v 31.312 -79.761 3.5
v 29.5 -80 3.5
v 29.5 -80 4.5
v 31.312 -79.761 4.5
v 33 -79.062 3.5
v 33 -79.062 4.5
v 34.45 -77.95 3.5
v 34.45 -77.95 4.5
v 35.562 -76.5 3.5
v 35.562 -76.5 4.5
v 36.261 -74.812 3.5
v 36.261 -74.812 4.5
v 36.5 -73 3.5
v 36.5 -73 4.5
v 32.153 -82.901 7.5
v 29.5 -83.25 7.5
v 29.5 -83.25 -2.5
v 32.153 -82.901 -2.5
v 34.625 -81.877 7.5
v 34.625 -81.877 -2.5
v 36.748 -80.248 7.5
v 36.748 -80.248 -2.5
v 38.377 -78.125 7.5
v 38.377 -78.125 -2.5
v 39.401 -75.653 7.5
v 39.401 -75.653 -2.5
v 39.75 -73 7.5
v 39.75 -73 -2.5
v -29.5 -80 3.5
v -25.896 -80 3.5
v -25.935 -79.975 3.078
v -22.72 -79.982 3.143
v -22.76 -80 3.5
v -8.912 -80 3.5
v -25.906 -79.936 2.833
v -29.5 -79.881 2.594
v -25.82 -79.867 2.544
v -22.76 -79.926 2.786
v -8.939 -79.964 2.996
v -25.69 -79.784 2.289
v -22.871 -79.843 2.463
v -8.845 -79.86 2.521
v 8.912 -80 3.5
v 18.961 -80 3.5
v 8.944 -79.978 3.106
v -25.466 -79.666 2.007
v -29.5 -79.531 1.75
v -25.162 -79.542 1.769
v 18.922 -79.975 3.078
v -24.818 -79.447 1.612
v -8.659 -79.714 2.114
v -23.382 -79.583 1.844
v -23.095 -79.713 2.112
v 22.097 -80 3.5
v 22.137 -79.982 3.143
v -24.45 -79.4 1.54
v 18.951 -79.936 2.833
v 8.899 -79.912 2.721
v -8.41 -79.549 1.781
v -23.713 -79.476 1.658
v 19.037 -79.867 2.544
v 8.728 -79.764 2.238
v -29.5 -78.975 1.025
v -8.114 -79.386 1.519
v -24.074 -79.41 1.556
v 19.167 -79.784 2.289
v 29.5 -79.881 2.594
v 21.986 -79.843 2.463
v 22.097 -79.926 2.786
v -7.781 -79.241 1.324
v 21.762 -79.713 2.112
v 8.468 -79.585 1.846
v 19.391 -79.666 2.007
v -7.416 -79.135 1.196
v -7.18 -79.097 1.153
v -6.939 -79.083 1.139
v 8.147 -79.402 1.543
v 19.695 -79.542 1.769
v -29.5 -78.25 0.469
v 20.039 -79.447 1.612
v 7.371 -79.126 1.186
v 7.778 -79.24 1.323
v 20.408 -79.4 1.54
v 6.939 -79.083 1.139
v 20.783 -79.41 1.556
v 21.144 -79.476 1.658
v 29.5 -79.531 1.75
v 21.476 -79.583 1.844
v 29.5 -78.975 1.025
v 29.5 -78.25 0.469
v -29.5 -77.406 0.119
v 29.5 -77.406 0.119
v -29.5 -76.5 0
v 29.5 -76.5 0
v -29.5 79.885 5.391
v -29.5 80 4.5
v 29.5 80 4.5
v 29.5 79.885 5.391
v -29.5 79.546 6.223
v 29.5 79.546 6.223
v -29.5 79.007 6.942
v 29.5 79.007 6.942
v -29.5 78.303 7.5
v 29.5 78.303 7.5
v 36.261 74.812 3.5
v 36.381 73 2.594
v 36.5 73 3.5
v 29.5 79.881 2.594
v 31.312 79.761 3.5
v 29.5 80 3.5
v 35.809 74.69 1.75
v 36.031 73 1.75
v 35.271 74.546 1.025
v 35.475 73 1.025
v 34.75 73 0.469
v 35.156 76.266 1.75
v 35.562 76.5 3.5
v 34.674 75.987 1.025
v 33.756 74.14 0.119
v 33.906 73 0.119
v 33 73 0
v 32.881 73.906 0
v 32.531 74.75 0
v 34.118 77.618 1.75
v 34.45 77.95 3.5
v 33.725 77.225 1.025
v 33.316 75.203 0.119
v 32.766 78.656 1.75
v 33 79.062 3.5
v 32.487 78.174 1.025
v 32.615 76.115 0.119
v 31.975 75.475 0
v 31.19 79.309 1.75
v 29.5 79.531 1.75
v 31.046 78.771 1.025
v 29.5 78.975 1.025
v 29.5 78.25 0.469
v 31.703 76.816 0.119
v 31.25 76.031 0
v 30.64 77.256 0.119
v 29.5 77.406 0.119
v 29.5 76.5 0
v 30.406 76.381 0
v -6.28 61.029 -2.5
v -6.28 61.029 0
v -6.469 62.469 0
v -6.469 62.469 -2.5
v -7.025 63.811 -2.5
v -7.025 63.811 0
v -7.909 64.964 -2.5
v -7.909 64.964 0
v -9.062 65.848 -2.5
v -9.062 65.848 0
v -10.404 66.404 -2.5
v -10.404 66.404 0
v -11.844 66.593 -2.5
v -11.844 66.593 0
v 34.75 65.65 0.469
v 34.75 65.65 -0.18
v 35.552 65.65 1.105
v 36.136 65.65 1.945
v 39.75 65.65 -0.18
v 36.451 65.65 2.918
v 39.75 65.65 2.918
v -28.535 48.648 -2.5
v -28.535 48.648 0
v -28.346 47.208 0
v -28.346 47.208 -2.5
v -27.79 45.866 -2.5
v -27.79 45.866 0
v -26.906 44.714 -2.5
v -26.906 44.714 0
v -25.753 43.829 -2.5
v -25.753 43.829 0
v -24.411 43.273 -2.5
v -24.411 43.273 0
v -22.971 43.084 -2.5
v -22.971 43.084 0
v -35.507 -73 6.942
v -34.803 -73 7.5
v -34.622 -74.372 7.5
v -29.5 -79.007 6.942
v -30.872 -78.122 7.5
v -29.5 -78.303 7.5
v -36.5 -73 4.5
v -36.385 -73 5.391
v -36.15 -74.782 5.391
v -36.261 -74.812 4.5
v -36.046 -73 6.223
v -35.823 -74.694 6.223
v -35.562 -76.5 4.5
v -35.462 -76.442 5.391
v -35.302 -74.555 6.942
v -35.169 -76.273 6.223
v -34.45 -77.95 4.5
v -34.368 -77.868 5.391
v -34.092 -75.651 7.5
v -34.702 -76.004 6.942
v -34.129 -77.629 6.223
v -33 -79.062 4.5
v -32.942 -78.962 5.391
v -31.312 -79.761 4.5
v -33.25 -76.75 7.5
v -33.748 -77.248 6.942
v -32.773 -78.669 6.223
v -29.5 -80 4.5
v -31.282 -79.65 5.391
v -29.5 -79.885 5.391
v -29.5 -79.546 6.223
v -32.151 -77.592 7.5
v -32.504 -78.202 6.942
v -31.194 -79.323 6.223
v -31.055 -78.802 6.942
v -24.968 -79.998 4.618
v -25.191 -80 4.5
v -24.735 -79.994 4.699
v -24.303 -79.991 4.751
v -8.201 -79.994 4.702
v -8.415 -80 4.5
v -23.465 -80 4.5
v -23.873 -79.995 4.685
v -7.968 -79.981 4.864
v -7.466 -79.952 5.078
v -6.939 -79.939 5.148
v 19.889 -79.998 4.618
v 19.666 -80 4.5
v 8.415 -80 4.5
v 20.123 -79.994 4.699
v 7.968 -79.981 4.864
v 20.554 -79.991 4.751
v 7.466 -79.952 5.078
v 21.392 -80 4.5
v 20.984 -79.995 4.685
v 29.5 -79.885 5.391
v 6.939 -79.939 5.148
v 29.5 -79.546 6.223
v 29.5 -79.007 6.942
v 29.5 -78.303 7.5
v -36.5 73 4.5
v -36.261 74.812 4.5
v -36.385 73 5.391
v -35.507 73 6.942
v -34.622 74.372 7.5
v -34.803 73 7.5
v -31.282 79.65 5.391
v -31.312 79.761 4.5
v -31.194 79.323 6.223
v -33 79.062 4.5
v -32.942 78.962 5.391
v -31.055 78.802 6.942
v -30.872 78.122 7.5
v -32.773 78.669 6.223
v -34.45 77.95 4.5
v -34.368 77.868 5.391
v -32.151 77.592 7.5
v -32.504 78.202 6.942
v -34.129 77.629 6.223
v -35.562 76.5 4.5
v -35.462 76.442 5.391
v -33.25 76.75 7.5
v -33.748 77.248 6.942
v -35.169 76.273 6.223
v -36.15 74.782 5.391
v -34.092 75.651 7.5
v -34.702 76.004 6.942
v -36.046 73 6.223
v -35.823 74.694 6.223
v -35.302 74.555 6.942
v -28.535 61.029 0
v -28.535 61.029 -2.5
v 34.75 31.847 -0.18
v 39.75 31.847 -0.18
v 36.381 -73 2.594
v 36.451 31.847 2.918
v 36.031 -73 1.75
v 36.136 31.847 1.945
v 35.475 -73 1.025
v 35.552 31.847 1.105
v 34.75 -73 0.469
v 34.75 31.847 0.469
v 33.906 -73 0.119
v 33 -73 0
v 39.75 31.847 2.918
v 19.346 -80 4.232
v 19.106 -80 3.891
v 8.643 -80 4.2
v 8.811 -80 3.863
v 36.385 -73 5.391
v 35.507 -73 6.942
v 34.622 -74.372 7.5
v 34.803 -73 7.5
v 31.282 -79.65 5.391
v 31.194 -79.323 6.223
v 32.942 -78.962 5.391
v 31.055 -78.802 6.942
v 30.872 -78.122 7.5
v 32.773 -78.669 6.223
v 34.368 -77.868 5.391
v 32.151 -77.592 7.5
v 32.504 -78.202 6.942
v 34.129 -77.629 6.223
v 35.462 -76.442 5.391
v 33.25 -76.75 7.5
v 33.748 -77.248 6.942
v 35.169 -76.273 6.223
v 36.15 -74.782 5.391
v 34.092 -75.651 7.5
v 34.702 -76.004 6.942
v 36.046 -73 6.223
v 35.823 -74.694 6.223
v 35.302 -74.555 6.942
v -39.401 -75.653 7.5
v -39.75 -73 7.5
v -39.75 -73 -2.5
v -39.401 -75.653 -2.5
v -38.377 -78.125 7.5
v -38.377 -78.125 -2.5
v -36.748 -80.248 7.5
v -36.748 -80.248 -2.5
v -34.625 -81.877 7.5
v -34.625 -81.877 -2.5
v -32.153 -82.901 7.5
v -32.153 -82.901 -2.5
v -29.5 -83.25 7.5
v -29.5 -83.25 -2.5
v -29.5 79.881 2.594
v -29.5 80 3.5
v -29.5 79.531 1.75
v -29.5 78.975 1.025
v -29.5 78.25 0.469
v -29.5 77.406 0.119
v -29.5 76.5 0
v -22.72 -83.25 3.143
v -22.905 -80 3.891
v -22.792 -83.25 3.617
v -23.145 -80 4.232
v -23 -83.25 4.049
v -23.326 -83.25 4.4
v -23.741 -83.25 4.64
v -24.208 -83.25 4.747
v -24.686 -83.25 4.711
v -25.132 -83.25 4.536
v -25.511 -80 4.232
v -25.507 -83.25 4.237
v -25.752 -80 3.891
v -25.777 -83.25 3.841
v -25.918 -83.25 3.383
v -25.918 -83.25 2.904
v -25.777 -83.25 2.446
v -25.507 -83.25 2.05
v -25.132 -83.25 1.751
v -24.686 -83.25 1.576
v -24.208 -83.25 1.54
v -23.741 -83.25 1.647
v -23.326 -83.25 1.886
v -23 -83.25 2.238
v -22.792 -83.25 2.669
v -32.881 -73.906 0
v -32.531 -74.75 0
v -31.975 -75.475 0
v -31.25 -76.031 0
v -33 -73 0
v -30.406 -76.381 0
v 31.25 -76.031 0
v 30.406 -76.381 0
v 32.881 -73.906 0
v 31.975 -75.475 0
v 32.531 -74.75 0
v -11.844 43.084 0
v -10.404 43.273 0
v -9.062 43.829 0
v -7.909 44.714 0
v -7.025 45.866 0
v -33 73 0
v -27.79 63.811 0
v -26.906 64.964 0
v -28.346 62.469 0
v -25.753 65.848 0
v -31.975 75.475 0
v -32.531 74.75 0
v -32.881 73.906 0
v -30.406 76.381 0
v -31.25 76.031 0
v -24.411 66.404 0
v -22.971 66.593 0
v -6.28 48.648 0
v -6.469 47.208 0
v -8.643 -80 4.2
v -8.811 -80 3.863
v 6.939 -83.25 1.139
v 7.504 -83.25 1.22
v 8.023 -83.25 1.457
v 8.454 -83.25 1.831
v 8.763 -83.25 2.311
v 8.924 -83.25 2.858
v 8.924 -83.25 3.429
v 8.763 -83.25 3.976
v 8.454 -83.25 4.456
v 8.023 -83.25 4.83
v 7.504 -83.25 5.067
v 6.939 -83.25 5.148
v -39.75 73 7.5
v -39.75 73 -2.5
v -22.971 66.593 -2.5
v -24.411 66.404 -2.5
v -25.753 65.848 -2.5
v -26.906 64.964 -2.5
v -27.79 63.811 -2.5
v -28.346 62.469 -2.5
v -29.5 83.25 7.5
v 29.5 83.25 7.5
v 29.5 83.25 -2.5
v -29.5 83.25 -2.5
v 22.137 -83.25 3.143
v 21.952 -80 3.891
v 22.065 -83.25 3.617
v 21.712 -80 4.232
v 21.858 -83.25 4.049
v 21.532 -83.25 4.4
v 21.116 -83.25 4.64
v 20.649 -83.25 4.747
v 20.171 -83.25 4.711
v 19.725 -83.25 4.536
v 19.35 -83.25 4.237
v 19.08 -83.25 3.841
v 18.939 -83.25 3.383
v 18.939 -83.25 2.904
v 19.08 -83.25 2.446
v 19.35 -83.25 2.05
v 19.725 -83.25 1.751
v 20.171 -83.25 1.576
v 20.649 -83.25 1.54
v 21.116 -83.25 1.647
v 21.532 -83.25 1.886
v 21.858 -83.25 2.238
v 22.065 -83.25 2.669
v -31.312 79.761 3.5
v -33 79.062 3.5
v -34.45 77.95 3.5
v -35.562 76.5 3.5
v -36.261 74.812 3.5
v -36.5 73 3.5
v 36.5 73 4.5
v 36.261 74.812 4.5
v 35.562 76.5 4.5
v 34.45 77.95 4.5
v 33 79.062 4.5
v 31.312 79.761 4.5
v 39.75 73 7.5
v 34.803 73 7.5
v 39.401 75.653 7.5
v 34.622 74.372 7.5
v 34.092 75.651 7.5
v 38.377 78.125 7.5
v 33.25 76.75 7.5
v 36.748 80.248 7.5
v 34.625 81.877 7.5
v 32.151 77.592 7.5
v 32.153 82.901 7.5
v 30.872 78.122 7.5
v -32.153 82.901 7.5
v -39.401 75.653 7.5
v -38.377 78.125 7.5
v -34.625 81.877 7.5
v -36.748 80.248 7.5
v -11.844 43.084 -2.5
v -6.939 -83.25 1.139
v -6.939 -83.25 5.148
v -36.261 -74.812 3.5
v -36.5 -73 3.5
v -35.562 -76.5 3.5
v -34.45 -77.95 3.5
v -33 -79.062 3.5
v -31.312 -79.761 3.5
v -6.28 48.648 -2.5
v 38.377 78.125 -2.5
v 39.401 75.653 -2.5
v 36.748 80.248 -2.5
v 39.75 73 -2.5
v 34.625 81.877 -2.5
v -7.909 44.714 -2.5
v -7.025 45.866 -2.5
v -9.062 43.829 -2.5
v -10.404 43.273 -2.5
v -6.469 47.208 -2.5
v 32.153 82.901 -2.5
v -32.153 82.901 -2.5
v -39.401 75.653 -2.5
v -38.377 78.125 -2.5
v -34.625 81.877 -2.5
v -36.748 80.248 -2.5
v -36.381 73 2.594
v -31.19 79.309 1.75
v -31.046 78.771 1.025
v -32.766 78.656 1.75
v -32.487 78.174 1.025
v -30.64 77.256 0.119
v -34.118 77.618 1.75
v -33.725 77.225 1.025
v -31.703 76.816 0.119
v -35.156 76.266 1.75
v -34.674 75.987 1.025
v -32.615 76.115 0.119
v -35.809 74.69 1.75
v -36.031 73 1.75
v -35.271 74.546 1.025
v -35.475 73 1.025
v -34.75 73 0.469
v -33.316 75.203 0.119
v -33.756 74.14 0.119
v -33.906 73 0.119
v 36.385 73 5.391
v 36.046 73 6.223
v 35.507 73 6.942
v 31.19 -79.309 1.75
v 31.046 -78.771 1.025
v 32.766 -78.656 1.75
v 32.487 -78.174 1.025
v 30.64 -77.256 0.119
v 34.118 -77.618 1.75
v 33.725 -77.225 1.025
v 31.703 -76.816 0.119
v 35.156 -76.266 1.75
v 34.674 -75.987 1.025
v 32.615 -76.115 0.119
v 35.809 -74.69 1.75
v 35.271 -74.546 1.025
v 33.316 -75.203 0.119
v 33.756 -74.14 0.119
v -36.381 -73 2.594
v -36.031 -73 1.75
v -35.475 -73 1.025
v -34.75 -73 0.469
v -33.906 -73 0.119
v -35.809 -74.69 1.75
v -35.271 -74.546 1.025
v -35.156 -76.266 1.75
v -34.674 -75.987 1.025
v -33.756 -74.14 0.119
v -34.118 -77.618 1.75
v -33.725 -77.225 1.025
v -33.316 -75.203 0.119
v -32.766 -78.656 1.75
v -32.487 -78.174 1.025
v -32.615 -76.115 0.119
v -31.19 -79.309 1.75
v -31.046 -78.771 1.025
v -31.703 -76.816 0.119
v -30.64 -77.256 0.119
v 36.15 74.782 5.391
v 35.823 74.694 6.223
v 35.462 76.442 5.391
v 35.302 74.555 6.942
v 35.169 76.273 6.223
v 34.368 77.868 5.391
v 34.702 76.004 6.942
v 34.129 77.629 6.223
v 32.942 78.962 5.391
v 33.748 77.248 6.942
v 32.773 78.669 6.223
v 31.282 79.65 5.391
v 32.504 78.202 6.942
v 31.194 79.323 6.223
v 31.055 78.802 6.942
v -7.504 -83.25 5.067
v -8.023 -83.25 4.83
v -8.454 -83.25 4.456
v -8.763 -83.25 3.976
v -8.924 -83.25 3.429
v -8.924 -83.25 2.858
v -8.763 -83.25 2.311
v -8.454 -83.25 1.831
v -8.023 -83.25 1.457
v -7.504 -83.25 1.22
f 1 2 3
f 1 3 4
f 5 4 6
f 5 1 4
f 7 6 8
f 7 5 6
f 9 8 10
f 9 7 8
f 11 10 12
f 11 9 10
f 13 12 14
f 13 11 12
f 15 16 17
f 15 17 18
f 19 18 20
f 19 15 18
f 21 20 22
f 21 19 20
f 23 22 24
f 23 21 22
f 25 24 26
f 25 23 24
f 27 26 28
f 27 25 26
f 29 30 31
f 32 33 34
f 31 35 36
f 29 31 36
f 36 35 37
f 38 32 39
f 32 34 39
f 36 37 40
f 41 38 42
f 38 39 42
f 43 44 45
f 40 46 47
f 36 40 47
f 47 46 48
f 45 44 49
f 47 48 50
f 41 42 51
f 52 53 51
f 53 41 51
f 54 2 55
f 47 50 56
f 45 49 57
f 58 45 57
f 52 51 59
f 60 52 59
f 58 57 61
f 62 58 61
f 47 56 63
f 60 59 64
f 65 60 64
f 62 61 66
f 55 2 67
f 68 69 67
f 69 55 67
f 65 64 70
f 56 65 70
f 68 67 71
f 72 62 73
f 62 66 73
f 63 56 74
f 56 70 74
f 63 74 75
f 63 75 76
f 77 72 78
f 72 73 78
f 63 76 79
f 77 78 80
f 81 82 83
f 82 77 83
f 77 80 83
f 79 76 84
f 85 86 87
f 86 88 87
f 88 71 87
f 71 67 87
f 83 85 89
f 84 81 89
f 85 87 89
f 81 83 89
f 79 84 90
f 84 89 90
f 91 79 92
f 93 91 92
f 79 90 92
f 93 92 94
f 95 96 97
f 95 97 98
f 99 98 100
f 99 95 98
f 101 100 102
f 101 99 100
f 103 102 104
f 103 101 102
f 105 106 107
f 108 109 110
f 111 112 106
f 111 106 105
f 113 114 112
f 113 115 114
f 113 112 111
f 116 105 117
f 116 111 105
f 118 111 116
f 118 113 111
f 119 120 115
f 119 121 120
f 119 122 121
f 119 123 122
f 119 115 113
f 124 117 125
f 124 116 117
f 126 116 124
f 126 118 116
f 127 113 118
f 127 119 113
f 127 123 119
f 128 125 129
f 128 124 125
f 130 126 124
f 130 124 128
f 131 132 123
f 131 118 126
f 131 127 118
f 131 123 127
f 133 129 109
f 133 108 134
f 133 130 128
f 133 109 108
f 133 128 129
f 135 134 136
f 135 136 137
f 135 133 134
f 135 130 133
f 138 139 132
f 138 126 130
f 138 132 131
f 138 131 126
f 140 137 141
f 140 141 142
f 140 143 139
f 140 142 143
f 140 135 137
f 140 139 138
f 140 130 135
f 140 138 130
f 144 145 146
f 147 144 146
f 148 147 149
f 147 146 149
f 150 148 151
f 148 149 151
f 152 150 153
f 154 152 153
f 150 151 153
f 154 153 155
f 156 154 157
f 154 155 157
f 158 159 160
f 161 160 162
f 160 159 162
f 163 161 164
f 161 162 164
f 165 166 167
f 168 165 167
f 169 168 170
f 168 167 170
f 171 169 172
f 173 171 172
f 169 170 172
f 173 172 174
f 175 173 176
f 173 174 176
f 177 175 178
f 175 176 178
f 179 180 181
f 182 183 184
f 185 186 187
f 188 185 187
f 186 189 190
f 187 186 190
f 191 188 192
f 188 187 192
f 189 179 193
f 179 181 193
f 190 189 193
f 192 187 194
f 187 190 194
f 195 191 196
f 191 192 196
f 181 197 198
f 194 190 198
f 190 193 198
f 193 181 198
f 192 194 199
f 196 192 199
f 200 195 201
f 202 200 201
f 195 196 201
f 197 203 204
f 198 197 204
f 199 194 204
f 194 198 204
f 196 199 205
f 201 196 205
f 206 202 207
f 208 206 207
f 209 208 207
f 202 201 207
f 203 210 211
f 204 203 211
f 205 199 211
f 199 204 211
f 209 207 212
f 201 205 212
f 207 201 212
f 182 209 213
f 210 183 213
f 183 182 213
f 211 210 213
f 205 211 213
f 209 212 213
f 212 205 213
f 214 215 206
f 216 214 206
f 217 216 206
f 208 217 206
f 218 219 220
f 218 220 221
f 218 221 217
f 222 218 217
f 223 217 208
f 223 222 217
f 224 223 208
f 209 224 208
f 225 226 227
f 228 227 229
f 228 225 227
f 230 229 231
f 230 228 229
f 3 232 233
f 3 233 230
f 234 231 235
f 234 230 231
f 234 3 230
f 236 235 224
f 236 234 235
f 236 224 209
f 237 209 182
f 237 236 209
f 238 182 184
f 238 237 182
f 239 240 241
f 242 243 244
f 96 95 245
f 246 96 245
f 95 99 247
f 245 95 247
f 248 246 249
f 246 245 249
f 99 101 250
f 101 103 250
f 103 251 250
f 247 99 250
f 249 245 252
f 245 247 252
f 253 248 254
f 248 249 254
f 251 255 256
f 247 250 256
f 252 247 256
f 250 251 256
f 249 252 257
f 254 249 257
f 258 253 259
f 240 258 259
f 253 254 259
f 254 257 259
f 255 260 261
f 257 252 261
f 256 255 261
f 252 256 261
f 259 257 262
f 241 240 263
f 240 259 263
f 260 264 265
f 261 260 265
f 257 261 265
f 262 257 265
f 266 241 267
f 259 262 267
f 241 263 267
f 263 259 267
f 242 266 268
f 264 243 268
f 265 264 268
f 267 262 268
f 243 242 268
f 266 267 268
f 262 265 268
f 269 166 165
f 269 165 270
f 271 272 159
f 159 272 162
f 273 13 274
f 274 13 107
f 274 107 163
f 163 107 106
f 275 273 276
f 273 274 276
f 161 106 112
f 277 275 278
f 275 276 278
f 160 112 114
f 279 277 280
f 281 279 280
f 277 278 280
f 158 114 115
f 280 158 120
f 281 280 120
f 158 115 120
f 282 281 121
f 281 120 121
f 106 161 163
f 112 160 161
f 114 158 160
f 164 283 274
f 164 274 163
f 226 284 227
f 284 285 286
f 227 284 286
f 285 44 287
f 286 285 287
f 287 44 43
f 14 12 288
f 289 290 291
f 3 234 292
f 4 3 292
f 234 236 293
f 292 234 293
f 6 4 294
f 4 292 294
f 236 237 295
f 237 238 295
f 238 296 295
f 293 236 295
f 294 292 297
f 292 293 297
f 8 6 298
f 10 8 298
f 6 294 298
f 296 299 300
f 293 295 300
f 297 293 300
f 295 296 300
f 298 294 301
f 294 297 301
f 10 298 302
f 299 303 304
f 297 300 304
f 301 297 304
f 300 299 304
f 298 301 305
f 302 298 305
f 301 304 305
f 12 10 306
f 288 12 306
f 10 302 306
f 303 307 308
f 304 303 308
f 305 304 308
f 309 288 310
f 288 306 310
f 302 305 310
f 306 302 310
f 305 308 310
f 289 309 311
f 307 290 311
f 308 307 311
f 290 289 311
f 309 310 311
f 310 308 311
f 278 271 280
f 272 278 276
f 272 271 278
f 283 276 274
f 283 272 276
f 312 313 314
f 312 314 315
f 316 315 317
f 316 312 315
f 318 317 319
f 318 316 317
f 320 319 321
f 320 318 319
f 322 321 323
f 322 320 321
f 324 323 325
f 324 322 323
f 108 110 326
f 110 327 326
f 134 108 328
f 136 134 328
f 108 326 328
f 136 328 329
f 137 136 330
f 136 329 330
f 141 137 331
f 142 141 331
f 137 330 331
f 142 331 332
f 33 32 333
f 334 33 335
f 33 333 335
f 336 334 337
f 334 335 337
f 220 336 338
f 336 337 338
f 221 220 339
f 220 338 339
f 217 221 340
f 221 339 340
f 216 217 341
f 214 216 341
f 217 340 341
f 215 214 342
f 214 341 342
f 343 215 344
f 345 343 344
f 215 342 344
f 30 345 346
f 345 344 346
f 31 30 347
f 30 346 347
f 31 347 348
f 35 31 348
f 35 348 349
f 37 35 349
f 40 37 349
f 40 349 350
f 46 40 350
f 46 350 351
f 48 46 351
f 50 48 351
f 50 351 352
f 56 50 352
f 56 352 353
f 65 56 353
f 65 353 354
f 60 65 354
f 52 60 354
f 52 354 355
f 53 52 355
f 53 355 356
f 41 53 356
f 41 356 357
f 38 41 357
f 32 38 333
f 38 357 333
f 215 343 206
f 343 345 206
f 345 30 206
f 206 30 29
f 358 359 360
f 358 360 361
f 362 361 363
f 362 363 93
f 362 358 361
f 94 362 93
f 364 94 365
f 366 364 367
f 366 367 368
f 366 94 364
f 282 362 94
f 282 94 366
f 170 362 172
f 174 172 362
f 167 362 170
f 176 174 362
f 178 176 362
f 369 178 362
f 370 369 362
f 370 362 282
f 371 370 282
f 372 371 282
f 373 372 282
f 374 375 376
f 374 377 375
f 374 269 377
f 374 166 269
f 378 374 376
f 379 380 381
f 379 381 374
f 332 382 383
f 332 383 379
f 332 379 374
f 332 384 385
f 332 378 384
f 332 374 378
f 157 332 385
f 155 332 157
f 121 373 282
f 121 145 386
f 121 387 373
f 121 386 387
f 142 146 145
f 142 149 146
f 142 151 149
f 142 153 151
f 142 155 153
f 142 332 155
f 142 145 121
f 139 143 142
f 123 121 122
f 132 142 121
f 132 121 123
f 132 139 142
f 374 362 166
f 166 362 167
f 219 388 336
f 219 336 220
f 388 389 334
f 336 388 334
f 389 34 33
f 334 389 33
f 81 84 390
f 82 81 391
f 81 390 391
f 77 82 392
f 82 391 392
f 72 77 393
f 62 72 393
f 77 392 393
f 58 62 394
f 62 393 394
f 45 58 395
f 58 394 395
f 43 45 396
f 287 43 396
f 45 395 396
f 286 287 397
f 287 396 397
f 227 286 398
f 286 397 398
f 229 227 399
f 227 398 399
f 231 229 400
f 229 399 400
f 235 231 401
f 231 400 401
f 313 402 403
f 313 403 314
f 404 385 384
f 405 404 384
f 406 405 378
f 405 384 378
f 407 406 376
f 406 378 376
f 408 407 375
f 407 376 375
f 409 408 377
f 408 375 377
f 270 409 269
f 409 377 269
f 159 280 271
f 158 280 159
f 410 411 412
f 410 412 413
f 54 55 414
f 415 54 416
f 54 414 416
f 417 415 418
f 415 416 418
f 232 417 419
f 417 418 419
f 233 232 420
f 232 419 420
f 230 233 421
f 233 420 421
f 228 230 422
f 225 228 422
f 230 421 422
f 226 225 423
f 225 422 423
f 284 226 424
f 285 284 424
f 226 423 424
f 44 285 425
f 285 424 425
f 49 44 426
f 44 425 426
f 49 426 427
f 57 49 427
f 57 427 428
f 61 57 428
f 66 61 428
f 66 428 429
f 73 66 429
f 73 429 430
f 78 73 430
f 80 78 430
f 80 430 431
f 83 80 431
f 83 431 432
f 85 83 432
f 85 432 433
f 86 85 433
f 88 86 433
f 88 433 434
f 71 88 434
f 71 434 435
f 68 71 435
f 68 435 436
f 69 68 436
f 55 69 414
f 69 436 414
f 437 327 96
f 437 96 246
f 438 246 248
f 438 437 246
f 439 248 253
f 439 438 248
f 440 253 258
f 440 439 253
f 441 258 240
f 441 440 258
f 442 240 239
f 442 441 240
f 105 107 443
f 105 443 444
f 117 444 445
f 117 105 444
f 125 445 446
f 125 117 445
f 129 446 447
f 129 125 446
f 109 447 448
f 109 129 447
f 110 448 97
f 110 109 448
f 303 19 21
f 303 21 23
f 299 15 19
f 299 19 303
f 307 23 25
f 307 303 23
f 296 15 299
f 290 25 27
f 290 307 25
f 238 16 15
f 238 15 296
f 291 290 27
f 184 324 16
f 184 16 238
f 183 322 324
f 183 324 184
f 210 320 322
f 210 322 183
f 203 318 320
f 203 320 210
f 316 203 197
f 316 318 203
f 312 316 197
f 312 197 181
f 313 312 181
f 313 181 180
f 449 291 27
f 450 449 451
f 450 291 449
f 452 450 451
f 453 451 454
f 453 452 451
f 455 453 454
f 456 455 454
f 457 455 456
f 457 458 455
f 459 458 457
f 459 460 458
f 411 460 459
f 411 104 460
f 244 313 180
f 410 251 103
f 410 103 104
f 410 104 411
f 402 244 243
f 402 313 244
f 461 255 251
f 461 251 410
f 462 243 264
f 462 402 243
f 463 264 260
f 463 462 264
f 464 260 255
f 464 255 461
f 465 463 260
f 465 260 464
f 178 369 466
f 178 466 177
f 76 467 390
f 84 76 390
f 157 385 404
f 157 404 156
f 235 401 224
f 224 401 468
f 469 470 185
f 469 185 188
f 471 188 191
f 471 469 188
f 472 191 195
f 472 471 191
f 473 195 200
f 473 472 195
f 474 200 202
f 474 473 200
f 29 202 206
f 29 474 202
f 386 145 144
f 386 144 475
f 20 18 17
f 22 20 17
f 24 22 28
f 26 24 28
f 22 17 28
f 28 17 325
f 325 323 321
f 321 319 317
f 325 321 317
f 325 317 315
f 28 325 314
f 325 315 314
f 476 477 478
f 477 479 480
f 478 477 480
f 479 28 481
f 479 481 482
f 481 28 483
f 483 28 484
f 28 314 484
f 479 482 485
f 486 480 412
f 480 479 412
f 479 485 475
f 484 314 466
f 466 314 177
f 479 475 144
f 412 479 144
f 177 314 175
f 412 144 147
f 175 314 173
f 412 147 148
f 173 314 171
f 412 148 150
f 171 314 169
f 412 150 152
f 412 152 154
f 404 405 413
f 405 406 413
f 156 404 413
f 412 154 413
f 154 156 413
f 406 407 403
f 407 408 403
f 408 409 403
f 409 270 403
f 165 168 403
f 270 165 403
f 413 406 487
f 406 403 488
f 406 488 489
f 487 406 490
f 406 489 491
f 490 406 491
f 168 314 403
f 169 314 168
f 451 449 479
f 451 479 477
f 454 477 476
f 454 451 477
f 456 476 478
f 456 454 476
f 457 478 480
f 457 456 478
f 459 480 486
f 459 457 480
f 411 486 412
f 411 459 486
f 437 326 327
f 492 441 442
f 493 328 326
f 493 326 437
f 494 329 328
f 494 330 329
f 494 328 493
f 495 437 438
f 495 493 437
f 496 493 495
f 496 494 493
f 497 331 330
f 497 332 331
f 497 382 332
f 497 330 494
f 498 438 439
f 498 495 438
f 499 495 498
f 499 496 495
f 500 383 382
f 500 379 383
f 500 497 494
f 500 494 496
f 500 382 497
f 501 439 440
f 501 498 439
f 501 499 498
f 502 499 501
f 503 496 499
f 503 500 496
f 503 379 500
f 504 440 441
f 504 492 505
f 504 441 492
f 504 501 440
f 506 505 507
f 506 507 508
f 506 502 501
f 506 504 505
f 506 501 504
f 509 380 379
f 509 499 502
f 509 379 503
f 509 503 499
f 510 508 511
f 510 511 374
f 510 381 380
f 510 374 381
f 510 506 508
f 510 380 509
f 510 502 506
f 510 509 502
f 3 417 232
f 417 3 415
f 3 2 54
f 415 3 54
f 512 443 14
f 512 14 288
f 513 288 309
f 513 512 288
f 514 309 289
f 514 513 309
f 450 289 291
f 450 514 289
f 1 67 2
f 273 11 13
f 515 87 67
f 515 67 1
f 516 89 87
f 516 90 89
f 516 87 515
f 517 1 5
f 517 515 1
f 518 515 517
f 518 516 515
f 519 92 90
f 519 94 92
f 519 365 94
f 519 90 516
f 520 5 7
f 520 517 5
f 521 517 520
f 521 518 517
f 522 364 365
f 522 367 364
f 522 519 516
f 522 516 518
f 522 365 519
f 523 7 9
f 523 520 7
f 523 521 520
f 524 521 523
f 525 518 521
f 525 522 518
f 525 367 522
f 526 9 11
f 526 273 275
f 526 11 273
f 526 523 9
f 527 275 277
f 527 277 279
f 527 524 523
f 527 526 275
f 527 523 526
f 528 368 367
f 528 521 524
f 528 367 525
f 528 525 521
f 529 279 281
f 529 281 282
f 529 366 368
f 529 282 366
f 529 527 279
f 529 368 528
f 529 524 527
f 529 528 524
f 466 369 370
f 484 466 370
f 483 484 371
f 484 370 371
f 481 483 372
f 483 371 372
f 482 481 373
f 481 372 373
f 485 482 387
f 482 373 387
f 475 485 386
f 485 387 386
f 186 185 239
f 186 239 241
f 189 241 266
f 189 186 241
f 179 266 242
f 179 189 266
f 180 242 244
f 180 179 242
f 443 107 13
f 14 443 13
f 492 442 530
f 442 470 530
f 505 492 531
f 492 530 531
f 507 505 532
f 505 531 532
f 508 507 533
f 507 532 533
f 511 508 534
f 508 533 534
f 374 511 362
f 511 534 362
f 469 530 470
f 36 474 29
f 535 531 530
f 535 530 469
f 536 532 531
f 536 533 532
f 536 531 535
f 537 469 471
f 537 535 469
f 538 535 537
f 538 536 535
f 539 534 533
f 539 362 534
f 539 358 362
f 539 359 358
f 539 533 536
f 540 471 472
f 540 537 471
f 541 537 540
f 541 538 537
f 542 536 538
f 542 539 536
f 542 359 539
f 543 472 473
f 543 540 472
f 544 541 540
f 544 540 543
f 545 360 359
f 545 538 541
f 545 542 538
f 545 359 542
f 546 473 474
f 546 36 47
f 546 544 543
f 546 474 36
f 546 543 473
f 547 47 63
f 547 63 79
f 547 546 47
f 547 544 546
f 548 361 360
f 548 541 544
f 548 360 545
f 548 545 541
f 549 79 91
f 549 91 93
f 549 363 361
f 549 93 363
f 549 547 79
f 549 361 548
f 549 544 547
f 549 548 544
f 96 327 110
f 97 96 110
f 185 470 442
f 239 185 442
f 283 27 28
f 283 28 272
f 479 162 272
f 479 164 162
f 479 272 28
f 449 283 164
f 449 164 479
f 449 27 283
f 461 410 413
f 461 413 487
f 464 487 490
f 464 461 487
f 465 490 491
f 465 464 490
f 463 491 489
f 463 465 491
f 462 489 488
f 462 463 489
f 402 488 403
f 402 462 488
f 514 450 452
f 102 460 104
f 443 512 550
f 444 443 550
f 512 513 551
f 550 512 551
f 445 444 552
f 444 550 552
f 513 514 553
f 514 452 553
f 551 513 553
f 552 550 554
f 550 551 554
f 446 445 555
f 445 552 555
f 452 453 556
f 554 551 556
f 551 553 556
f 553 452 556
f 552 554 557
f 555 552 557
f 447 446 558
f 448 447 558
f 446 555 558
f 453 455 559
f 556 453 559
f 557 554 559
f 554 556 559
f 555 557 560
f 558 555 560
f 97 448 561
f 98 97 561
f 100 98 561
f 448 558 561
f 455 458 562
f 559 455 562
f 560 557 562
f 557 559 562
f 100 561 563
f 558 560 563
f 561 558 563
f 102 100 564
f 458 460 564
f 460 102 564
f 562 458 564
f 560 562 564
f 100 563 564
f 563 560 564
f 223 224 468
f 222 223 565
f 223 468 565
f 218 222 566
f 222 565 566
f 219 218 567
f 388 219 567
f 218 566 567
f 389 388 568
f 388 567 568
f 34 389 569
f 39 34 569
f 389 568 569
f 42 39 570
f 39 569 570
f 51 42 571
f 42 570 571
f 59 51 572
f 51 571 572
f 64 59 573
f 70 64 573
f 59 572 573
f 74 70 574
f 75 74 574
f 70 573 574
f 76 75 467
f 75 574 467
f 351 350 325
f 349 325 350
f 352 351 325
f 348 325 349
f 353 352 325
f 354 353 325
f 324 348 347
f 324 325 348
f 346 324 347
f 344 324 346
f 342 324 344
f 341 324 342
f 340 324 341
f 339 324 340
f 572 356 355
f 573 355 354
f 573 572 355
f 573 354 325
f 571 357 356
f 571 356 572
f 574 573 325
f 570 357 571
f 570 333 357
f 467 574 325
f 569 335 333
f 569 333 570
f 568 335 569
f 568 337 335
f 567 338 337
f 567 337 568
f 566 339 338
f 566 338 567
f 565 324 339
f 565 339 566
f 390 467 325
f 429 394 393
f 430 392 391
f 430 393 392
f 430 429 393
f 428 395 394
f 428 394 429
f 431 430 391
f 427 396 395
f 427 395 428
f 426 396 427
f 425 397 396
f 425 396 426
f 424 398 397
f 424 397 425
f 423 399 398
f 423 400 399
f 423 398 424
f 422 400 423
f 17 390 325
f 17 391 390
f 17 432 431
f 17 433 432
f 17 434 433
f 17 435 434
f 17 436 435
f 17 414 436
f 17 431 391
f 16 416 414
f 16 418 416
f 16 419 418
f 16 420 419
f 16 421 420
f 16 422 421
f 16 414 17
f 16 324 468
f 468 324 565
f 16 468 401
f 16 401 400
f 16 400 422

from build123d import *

# Parameters (mm, degrees)
PAD_DEPTH       = 8
FILLET_R        = 3.5
PAD001_DEPTH    = 2.5
PAD002_DEPTH    = 10
SKETCH002_R     = 1.607891
POCKET_DEPTH    = 5
POCKET001_DEPTH = 2.501
SKETCH004_W     = 33.802838
SKETCH004_H     = 3.098588
POCKET002_DEPTH = 5


with BuildPart() as blankbody:
    # Sketch → Pad (new body)
    with BuildSketch(Plane.XY):
        with BuildLine():
            ThreePointArc((-29.5, 80), (-34.449747, 77.949747), (-36.5, 73))
            Line((-36.5, -73), (-36.5, 73))
            ThreePointArc((-36.5, -73), (-34.449747, -77.949747), (-29.5, -80))
            Line((29.5, -80), (-29.5, -80))
            ThreePointArc((29.5, -80), (34.449747, -77.949747), (36.5, -73))
            Line((36.5, 73), (36.5, -73))
            ThreePointArc((36.5, 73), (34.449747, 77.949747), (29.5, 80))
            Line((-29.5, 80), (29.5, 80))
        make_face()
    extrude(amount=PAD_DEPTH)

    # Fillet
    fillet_edges = [blankbody.edges().sort_by_distance(p)[0] for p in [
        (-34.449747, 77.949747, 8),
        (-36.5, 0, 8),
        (-34.449747, -77.949747, 8),
        (0, -80, 8),
        (34.449747, -77.949747, 8),
        (36.5, 0, 8),
        (34.449747, 77.949747, 8),
        (0, 80, 8),
        (-34.449747, 77.949747, 0),
        (-36.5, 0, 0),
        (-34.449747, -77.949747, 0),
        (0, -80, 0),
        (34.449747, -77.949747, 0),
        (36.5, 0, 0),
        (34.449747, 77.949747, 0),
        (0, 80, 0),
    ]]
    fillet(fillet_edges, radius=FILLET_R)

    # Sketch001 (on Face11 of Fillet) → Pad001 (join, symmetric)
    with BuildSketch(Plane.XY.offset(8)):
        with BuildLine():
            ThreePointArc((-29.5, 78.25), (-33.212311, 76.712311), (-34.75, 73))
            Line((-34.75, -73), (-34.75, 73))
            ThreePointArc((-34.75, -73), (-33.212311, -76.712311), (-29.5, -78.25))
            Line((29.5, -78.25), (-29.5, -78.25))
            ThreePointArc((29.5, -78.25), (33.212311, -76.712311), (34.75, -73))
            Line((34.75, 73), (34.75, -73))
            ThreePointArc((34.75, 73), (33.212311, 76.712311), (29.5, 78.25))
            Line((-29.5, 78.25), (29.5, 78.25))
        make_face()
    extrude(amount=PAD001_DEPTH, both=True)


with BuildPart() as casebody:
    # Binder → Pad002 (new body)
    with BuildSketch(Plane(origin=(0, 0, 7.5), x_dir=(0, 1, 0), z_dir=(0, 0, 1))):
        with BuildLine():
            ThreePointArc((83.25, 29.5), (80.247845, 36.747845), (73, 39.75))
            Line((73, 39.75), (-73, 39.75))
            ThreePointArc((-73, 39.75), (-80.247845, 36.747845), (-83.25, 29.5))
            Line((-83.25, 29.5), (-83.25, -29.5))
            ThreePointArc((-83.25, -29.5), (-80.247845, -36.747845), (-73, -39.75))
            Line((-73, -39.75), (73, -39.75))
            ThreePointArc((73, -39.75), (80.247845, -36.747845), (83.25, -29.5))
            Line((83.25, -29.5), (83.25, 29.5))
        make_face()
    extrude(amount=-PAD002_DEPTH)

    # Boolean: cut BlankBody
    add(blankbody.part, mode=Mode.SUBTRACT)

    # Sketch002 (on Face9 of Boolean) → Pocket (cut)
    with BuildSketch(Plane.XZ.offset(83.25)):
        with Locations((-24.328213, 3.143363)):
            Circle(SKETCH002_R)
        with Locations((20.529039, 3.143363)):
            Circle(SKETCH002_R)
        with BuildLine():
            ThreePointArc((-6.939364, 5.148021), (-8.944022, 3.143363), (-6.939364, 1.138705))
            Line((-6.939364, 1.138705), (6.939364, 1.138705))
            ThreePointArc((6.939364, 1.138705), (8.944022, 3.143363), (6.939364, 5.148021))
            Line((6.939364, 5.148021), (-6.939364, 5.148021))
        make_face()
    extrude(amount=-POCKET_DEPTH, mode=Mode.SUBTRACT)

    # Sketch003 (on Face44 of Pocket) → Pocket001 (cut, through all)
    with BuildSketch(Plane.XY):
        with BuildLine():
            ThreePointArc((-22.971405, 66.593148), (-26.905647, 64.963532), (-28.535263, 61.02929))
            Line((-28.535263, 48.647752), (-28.535263, 61.02929))
            ThreePointArc((-28.535263, 48.647752), (-26.905647, 44.71351), (-22.971405, 43.083894))
            Line((-11.843698, 43.083894), (-22.971405, 43.083894))
            ThreePointArc((-11.843698, 43.083894), (-7.909456, 44.71351), (-6.27984, 48.647752))
            Line((-6.27984, 61.02929), (-6.27984, 48.647752))
            ThreePointArc((-6.27984, 61.02929), (-7.909456, 64.963532), (-11.843698, 66.593148))
            Line((-22.971405, 66.593148), (-11.843698, 66.593148))
        make_face()
    extrude(amount=-POCKET001_DEPTH, mode=Mode.SUBTRACT)

    # Sketch004 (on Face8 of Pocket001) → Pocket002 (cut)
    with BuildSketch(Plane.YZ.offset(39.75)):
        with Locations((48.748877, 1.369124)):
            Rectangle(SKETCH004_W, SKETCH004_H)
    extrude(amount=-POCKET002_DEPTH, mode=Mode.SUBTRACT)


solid = casebody.part
